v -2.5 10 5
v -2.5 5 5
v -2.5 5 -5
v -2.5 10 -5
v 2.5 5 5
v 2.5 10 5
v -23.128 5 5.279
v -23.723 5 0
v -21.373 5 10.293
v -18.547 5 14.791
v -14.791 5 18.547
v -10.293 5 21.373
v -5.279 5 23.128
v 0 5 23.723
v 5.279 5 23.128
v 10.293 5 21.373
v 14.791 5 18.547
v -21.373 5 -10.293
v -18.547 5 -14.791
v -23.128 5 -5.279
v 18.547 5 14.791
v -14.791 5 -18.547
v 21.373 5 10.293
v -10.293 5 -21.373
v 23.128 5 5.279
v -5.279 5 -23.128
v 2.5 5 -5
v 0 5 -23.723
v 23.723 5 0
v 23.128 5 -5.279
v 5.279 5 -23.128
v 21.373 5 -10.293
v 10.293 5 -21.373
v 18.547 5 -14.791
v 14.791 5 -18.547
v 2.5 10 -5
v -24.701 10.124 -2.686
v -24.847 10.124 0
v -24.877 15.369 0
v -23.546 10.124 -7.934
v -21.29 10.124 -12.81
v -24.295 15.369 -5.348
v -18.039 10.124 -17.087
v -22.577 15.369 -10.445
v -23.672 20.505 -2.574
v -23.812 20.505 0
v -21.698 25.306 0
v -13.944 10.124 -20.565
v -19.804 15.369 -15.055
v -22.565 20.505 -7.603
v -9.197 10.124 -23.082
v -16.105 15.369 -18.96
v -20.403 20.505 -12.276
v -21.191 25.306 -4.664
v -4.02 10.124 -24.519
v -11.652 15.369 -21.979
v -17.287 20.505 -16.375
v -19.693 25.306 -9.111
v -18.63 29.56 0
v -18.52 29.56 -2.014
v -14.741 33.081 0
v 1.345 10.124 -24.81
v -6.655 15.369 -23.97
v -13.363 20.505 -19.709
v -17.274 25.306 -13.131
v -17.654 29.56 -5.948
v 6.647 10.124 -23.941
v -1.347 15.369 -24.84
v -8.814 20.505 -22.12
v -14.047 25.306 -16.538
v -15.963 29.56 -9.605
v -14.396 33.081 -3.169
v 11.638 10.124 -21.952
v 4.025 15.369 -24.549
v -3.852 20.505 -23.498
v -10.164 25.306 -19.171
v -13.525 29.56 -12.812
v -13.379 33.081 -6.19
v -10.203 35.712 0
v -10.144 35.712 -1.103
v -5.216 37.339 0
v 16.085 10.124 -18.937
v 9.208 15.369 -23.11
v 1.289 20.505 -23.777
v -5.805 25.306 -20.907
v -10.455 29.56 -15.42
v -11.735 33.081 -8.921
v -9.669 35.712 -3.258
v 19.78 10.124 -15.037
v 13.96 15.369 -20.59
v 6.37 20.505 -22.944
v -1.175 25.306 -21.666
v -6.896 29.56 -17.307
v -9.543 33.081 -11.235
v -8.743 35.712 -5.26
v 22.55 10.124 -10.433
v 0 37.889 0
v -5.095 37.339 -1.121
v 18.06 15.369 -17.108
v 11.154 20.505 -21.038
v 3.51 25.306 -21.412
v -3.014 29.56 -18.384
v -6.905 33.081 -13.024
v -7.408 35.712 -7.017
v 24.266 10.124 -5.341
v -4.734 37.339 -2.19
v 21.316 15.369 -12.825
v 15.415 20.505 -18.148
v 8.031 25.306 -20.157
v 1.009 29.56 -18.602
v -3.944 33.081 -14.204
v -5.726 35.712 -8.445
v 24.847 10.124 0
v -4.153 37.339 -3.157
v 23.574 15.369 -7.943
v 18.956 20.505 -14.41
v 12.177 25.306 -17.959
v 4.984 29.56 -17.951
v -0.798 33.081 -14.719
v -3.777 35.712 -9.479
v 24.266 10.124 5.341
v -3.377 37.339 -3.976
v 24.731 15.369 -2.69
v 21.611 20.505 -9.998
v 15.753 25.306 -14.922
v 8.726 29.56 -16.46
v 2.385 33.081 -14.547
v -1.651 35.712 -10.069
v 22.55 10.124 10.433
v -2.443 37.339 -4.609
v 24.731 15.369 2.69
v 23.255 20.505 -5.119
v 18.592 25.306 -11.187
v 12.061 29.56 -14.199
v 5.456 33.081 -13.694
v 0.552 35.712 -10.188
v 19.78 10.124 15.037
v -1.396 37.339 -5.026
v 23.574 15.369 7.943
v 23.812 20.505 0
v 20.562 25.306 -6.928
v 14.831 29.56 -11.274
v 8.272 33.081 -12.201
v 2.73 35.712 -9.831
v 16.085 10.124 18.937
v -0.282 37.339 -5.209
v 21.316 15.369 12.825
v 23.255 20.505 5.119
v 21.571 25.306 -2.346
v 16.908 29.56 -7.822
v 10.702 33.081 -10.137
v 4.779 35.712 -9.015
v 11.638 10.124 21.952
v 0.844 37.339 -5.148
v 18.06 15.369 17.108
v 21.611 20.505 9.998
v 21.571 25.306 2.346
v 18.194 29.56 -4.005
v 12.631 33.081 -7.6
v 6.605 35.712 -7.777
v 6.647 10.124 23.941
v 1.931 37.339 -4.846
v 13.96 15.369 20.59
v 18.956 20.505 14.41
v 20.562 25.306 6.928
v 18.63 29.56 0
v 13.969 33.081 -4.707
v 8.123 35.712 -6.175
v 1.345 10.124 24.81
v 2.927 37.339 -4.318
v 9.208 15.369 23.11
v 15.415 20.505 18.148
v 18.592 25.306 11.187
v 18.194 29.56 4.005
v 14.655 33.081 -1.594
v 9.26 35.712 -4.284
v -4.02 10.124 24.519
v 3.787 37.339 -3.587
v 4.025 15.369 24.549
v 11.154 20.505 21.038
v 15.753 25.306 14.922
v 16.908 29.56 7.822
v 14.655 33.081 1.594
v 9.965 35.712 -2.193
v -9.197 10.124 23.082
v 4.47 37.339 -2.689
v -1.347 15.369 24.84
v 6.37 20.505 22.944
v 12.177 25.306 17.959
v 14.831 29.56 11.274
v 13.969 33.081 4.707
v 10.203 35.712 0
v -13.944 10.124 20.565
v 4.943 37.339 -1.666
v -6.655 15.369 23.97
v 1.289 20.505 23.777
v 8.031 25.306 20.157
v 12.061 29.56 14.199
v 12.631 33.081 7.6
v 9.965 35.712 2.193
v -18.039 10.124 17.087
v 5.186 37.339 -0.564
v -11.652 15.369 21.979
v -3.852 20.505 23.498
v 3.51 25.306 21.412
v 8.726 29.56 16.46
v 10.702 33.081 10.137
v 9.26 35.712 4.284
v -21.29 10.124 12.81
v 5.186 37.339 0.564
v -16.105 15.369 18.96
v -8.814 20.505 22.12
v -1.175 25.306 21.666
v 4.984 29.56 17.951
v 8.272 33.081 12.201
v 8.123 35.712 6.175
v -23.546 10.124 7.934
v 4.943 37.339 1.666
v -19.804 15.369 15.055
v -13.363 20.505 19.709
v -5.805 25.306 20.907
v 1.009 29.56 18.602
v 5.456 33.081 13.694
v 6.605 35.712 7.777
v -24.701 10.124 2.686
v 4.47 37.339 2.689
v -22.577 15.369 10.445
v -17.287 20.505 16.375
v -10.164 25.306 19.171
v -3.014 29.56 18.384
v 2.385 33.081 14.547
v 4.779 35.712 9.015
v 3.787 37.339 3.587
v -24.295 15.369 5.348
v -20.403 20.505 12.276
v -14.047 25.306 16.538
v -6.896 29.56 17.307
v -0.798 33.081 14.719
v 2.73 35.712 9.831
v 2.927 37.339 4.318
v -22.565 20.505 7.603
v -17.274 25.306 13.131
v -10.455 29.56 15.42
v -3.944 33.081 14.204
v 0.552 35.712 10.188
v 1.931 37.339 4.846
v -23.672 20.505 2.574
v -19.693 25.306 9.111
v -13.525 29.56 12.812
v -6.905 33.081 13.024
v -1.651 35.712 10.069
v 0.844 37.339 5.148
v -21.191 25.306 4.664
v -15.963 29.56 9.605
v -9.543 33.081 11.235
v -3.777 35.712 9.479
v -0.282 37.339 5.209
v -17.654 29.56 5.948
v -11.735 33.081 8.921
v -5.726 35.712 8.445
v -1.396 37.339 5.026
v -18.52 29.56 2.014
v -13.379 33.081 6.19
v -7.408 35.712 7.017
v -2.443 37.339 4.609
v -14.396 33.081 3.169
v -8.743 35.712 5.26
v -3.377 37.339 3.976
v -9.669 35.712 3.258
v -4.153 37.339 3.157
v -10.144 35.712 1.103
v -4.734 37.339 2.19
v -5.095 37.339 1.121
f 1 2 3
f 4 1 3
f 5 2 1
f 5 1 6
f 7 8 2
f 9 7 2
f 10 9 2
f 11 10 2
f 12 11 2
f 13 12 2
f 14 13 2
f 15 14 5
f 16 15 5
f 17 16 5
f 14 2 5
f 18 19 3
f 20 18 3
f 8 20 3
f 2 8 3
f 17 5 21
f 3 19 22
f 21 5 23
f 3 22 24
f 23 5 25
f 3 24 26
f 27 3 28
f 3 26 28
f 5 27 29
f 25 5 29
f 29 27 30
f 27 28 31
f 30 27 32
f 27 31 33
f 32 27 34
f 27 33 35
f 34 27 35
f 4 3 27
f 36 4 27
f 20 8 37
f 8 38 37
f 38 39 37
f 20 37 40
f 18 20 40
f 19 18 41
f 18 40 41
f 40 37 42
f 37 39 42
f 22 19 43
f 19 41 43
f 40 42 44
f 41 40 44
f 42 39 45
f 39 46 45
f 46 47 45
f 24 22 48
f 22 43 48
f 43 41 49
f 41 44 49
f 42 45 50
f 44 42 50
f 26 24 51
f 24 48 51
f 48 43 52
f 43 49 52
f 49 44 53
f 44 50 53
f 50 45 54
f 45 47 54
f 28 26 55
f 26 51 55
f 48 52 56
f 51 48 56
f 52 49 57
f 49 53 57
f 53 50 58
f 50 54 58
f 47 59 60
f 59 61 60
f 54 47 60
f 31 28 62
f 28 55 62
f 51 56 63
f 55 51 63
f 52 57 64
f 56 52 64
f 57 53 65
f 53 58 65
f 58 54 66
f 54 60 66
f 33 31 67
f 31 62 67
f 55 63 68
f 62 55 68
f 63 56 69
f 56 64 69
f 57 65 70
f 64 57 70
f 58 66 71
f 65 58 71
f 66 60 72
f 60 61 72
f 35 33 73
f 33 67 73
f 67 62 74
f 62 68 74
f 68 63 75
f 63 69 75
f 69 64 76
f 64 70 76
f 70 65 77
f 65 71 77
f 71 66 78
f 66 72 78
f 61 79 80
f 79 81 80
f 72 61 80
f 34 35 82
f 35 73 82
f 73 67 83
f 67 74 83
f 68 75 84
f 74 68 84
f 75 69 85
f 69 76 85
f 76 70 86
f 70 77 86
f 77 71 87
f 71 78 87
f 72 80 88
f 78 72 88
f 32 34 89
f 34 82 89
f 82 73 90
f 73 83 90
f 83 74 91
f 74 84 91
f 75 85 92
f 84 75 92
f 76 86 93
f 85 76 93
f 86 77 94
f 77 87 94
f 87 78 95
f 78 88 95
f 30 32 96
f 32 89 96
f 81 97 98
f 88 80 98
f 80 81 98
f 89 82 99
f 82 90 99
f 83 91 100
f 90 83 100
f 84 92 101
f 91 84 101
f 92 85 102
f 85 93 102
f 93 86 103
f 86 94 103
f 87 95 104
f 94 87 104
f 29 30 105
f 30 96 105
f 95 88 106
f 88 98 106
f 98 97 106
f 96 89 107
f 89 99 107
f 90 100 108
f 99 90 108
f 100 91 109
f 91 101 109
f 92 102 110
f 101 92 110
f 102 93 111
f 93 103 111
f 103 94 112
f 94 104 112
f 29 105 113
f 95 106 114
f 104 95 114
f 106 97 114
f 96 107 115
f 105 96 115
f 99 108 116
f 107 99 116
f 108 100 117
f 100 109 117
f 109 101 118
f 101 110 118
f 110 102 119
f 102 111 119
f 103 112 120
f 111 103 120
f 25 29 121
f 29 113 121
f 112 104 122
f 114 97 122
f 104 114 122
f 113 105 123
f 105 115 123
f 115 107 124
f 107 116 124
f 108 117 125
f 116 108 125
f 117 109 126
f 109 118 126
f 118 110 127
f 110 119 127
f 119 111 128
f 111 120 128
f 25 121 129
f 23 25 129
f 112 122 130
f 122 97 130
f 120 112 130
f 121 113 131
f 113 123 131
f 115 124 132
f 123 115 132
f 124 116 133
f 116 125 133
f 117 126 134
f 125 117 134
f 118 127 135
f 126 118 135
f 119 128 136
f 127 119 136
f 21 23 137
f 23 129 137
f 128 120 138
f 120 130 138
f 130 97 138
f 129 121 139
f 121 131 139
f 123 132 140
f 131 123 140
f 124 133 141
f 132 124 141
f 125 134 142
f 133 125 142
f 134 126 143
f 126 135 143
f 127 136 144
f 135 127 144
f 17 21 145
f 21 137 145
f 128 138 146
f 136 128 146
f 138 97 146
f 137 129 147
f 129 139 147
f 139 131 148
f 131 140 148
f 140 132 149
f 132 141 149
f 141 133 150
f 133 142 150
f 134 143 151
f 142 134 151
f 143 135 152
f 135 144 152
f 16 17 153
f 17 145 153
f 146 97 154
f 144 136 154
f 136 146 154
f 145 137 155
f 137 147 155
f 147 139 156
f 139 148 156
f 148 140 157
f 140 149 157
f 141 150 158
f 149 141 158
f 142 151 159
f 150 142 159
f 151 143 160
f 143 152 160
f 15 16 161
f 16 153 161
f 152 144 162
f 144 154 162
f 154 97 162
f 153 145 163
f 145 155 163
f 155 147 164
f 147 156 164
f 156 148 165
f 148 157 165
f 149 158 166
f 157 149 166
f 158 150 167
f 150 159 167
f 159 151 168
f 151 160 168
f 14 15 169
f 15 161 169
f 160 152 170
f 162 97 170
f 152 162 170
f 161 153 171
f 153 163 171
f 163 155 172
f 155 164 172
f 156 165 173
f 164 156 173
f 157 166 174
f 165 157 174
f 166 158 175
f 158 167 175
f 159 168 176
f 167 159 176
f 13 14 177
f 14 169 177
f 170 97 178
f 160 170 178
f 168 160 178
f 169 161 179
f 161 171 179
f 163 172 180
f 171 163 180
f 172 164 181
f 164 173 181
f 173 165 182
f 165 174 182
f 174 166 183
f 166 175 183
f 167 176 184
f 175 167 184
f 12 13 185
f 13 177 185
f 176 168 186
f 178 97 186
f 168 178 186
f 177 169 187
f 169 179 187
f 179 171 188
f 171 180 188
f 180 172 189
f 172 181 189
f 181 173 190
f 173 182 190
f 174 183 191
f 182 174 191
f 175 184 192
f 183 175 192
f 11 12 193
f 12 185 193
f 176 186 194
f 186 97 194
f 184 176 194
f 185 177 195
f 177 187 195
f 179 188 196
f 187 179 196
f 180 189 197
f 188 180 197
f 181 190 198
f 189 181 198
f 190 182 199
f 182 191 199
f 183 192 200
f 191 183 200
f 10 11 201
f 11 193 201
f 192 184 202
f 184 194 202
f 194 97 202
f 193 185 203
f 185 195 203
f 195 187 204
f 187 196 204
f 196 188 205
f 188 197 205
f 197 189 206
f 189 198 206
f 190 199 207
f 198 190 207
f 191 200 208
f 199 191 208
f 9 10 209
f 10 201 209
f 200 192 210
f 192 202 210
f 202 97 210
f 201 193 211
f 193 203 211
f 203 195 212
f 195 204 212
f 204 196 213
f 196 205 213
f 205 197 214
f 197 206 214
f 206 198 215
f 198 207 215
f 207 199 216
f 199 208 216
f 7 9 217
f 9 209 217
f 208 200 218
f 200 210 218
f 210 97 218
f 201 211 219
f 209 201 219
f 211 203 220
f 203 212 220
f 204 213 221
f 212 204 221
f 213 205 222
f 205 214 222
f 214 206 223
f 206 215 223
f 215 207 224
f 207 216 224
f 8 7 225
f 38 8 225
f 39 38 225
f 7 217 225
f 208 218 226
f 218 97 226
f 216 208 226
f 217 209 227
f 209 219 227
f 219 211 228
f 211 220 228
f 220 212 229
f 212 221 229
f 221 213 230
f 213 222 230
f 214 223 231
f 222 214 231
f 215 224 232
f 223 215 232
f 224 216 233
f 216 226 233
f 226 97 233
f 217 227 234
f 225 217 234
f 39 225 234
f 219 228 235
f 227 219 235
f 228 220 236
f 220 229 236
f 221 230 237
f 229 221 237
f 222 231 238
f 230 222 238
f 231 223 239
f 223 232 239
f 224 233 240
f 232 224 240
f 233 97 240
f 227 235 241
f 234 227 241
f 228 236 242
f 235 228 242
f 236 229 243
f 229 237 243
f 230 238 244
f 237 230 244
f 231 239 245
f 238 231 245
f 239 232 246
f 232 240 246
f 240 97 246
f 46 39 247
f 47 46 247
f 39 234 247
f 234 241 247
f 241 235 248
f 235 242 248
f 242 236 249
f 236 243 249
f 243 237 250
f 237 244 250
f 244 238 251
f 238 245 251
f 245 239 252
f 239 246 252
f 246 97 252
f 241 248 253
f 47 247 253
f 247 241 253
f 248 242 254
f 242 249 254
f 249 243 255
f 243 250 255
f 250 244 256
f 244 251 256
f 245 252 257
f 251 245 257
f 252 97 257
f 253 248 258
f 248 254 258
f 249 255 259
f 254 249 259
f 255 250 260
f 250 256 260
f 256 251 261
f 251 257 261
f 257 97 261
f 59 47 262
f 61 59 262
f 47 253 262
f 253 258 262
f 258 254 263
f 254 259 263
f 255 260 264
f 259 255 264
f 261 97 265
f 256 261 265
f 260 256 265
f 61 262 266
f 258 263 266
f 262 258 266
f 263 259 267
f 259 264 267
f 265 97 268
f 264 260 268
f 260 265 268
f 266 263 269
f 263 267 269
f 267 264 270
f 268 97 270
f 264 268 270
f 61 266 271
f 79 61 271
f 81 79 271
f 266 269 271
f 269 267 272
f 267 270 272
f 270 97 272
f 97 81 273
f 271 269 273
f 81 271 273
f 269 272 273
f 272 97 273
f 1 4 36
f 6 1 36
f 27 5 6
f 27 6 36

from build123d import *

# Parameters (mm, degrees)
SKETCH6_W          = 61.139548952
SKETCH6_H          = 56.128506874
CUT_EXTRUDE7_DEPTH = 5
SKETCH7_W          = 5
SKETCH7_H          = 10
CUT_EXTRUDE8_DEPTH = 10


with BuildPart() as part:
    # Sketch1 → Revolve1 (revolve)
    with BuildSketch(Plane.XY):
        with BuildLine():
            Line((0, 37.888888889), (0, -12.111111111))
            ThreePointArc((0, -12.111111111), (-25, 12.888888889), (0, 37.888888889))
        make_face()
    revolve(axis=Axis((0, 37.888888889, 0), (0, -1, 0)))

    # Sketch6 → Cut-Extrude7 (cut, symmetric)
    with BuildSketch(Plane(origin=(0, 0, 0), x_dir=(1, 0, 0), z_dir=(0, 1, 0))):
        Rectangle(SKETCH6_W, SKETCH6_H)
    extrude(amount=CUT_EXTRUDE7_DEPTH, both=True, mode=Mode.SUBTRACT)


with BuildPart() as body_2:
    # of the pieces the cut leaves, the one that is kept (cut_extrude7_keep)
    add(part.part.solids().sort_by_distance((-23.722677591, 5, 0))[0])

    # Sketch7 → Cut-Extrude8 (cut)
    with BuildSketch(Plane(origin=(0, 0, 0), x_dir=(1, 0, 0), z_dir=(0, 1, 0))):
        Rectangle(SKETCH7_W, SKETCH7_H)
    extrude(amount=CUT_EXTRUDE8_DEPTH, mode=Mode.SUBTRACT)


solid = body_2.part
